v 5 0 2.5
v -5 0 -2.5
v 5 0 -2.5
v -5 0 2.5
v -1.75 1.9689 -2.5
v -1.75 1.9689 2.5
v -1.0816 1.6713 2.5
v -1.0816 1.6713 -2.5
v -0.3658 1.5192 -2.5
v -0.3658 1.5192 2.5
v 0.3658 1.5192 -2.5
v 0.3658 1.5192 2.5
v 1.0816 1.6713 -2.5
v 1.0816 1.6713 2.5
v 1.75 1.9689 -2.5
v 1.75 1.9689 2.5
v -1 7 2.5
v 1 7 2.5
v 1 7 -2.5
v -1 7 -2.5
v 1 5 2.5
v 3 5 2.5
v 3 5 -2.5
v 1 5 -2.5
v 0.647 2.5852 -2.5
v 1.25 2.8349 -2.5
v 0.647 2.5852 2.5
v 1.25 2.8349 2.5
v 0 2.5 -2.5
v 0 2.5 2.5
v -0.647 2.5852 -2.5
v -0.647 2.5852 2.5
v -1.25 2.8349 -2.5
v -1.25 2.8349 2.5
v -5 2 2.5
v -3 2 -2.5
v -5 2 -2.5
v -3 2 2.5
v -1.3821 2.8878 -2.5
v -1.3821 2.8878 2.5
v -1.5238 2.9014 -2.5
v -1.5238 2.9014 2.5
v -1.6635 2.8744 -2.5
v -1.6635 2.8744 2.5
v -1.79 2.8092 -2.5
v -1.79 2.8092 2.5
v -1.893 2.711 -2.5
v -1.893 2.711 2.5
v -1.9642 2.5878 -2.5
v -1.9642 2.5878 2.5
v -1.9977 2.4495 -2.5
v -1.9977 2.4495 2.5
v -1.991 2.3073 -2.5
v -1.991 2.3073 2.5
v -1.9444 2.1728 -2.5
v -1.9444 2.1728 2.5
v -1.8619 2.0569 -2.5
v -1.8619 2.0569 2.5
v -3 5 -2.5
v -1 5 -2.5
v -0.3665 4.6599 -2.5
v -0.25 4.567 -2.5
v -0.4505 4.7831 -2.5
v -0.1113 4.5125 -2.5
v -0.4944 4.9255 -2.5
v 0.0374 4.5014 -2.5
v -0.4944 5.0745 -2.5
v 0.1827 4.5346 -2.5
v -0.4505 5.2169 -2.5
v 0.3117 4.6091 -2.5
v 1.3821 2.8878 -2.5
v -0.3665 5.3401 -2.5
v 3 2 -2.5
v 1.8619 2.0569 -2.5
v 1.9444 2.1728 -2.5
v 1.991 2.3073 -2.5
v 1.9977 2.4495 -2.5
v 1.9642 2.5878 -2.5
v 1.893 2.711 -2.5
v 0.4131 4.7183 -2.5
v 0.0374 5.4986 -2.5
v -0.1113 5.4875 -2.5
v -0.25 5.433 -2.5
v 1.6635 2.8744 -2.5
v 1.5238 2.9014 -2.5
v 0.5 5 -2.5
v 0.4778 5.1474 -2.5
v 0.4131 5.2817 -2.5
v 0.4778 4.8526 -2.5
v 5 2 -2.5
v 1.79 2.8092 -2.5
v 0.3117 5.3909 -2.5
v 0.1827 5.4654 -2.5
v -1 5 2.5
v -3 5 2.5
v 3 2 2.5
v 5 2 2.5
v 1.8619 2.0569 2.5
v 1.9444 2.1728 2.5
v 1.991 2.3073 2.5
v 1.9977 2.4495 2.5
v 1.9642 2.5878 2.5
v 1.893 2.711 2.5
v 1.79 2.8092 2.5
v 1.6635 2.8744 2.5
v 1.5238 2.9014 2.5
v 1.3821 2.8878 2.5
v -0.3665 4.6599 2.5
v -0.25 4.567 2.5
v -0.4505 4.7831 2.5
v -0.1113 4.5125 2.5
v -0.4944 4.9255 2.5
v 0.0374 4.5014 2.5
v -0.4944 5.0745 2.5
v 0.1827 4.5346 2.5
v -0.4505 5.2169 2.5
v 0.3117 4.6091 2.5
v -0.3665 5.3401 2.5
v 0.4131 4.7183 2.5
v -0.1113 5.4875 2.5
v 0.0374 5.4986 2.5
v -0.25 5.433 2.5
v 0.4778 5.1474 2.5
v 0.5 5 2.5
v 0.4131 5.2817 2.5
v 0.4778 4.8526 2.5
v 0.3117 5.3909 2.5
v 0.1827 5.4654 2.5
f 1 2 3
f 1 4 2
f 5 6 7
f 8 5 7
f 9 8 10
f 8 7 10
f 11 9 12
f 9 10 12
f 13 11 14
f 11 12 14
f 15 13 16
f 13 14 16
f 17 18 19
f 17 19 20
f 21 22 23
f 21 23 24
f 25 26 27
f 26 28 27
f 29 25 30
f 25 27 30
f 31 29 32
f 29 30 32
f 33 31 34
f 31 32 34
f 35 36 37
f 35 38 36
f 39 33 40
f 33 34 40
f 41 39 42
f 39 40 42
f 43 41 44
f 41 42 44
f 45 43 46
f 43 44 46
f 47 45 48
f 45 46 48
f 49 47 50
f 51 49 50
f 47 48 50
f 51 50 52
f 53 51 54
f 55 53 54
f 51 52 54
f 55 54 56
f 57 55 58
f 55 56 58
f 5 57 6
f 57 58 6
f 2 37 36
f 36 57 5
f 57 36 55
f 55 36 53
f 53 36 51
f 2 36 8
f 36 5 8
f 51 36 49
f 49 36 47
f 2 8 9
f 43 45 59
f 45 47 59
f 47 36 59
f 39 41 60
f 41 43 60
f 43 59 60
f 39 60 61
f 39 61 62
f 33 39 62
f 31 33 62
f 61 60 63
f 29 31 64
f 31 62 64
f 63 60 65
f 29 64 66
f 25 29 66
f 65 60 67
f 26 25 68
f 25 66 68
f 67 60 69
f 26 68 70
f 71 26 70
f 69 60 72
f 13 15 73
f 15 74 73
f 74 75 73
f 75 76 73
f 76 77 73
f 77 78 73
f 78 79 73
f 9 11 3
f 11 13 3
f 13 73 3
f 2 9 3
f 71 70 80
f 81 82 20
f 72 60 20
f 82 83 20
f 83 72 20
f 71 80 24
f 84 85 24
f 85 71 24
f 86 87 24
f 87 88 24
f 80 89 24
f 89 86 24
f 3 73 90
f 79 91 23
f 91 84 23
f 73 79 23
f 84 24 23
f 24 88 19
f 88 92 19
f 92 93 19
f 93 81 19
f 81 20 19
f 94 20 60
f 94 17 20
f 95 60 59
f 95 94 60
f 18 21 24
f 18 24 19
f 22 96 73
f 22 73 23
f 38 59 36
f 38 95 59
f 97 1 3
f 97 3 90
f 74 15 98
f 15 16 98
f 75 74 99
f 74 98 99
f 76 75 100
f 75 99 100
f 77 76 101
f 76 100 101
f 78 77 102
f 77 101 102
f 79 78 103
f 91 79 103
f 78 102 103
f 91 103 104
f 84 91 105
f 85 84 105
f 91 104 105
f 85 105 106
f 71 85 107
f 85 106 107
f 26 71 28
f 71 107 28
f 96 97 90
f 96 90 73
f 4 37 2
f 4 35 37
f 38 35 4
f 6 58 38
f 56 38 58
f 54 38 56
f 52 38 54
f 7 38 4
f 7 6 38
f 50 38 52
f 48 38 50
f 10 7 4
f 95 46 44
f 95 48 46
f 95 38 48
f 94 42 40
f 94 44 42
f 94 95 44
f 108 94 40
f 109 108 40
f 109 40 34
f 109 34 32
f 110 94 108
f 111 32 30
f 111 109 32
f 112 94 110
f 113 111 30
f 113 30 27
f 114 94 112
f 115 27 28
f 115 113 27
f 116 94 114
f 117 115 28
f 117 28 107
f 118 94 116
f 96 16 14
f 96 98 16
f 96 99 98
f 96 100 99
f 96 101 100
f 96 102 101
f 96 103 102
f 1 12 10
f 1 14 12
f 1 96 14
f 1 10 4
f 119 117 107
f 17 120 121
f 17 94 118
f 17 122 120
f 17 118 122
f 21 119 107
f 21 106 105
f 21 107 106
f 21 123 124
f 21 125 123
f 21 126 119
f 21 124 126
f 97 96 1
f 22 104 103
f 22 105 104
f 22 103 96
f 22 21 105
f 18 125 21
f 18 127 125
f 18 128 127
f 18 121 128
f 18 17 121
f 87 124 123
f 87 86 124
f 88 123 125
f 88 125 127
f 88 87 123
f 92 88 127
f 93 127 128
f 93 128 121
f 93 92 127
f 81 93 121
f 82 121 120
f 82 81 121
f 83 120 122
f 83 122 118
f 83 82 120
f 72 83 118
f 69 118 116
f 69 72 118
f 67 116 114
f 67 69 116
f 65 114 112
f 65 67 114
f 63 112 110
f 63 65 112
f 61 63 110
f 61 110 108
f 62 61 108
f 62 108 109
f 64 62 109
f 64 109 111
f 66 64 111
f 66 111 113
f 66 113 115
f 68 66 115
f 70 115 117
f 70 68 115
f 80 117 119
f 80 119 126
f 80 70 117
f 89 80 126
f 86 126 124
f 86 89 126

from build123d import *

# Parameters (mm, degrees)
SKETCH2_R           = 0.5
BOSS_EXTRUDE1_DEPTH = 2.5


with BuildPart() as part:
    # Sketch2 → Boss-Extrude1 (new, symmetric)
    with BuildSketch(Plane.XY):
        Polygon((-5, 0), (5, 0), (5, 2), (3, 2), (3, 5), (1, 5), (1, 7), (-1, 7), (-1, 5), (-3, 5), (-3, 2), (-5, 2), align=None)
        with Locations((0, 5)):
            Circle(SKETCH2_R, mode=Mode.SUBTRACT)
        with BuildLine():
            ThreePointArc((-1.75, 1.968911087), (0, 1.5), (1.75, 1.968911087))
            ThreePointArc((1.75, 1.968911087), (1.933012702, 2.651923789), (1.25, 2.834936491))
            ThreePointArc((1.25, 2.834936491), (0, 2.5), (-1.25, 2.834936491))
            ThreePointArc((-1.25, 2.834936491), (-1.933012702, 2.651923789), (-1.75, 1.968911087))
        make_face(mode=Mode.SUBTRACT)
    extrude(amount=BOSS_EXTRUDE1_DEPTH, both=True)


solid = part.part
